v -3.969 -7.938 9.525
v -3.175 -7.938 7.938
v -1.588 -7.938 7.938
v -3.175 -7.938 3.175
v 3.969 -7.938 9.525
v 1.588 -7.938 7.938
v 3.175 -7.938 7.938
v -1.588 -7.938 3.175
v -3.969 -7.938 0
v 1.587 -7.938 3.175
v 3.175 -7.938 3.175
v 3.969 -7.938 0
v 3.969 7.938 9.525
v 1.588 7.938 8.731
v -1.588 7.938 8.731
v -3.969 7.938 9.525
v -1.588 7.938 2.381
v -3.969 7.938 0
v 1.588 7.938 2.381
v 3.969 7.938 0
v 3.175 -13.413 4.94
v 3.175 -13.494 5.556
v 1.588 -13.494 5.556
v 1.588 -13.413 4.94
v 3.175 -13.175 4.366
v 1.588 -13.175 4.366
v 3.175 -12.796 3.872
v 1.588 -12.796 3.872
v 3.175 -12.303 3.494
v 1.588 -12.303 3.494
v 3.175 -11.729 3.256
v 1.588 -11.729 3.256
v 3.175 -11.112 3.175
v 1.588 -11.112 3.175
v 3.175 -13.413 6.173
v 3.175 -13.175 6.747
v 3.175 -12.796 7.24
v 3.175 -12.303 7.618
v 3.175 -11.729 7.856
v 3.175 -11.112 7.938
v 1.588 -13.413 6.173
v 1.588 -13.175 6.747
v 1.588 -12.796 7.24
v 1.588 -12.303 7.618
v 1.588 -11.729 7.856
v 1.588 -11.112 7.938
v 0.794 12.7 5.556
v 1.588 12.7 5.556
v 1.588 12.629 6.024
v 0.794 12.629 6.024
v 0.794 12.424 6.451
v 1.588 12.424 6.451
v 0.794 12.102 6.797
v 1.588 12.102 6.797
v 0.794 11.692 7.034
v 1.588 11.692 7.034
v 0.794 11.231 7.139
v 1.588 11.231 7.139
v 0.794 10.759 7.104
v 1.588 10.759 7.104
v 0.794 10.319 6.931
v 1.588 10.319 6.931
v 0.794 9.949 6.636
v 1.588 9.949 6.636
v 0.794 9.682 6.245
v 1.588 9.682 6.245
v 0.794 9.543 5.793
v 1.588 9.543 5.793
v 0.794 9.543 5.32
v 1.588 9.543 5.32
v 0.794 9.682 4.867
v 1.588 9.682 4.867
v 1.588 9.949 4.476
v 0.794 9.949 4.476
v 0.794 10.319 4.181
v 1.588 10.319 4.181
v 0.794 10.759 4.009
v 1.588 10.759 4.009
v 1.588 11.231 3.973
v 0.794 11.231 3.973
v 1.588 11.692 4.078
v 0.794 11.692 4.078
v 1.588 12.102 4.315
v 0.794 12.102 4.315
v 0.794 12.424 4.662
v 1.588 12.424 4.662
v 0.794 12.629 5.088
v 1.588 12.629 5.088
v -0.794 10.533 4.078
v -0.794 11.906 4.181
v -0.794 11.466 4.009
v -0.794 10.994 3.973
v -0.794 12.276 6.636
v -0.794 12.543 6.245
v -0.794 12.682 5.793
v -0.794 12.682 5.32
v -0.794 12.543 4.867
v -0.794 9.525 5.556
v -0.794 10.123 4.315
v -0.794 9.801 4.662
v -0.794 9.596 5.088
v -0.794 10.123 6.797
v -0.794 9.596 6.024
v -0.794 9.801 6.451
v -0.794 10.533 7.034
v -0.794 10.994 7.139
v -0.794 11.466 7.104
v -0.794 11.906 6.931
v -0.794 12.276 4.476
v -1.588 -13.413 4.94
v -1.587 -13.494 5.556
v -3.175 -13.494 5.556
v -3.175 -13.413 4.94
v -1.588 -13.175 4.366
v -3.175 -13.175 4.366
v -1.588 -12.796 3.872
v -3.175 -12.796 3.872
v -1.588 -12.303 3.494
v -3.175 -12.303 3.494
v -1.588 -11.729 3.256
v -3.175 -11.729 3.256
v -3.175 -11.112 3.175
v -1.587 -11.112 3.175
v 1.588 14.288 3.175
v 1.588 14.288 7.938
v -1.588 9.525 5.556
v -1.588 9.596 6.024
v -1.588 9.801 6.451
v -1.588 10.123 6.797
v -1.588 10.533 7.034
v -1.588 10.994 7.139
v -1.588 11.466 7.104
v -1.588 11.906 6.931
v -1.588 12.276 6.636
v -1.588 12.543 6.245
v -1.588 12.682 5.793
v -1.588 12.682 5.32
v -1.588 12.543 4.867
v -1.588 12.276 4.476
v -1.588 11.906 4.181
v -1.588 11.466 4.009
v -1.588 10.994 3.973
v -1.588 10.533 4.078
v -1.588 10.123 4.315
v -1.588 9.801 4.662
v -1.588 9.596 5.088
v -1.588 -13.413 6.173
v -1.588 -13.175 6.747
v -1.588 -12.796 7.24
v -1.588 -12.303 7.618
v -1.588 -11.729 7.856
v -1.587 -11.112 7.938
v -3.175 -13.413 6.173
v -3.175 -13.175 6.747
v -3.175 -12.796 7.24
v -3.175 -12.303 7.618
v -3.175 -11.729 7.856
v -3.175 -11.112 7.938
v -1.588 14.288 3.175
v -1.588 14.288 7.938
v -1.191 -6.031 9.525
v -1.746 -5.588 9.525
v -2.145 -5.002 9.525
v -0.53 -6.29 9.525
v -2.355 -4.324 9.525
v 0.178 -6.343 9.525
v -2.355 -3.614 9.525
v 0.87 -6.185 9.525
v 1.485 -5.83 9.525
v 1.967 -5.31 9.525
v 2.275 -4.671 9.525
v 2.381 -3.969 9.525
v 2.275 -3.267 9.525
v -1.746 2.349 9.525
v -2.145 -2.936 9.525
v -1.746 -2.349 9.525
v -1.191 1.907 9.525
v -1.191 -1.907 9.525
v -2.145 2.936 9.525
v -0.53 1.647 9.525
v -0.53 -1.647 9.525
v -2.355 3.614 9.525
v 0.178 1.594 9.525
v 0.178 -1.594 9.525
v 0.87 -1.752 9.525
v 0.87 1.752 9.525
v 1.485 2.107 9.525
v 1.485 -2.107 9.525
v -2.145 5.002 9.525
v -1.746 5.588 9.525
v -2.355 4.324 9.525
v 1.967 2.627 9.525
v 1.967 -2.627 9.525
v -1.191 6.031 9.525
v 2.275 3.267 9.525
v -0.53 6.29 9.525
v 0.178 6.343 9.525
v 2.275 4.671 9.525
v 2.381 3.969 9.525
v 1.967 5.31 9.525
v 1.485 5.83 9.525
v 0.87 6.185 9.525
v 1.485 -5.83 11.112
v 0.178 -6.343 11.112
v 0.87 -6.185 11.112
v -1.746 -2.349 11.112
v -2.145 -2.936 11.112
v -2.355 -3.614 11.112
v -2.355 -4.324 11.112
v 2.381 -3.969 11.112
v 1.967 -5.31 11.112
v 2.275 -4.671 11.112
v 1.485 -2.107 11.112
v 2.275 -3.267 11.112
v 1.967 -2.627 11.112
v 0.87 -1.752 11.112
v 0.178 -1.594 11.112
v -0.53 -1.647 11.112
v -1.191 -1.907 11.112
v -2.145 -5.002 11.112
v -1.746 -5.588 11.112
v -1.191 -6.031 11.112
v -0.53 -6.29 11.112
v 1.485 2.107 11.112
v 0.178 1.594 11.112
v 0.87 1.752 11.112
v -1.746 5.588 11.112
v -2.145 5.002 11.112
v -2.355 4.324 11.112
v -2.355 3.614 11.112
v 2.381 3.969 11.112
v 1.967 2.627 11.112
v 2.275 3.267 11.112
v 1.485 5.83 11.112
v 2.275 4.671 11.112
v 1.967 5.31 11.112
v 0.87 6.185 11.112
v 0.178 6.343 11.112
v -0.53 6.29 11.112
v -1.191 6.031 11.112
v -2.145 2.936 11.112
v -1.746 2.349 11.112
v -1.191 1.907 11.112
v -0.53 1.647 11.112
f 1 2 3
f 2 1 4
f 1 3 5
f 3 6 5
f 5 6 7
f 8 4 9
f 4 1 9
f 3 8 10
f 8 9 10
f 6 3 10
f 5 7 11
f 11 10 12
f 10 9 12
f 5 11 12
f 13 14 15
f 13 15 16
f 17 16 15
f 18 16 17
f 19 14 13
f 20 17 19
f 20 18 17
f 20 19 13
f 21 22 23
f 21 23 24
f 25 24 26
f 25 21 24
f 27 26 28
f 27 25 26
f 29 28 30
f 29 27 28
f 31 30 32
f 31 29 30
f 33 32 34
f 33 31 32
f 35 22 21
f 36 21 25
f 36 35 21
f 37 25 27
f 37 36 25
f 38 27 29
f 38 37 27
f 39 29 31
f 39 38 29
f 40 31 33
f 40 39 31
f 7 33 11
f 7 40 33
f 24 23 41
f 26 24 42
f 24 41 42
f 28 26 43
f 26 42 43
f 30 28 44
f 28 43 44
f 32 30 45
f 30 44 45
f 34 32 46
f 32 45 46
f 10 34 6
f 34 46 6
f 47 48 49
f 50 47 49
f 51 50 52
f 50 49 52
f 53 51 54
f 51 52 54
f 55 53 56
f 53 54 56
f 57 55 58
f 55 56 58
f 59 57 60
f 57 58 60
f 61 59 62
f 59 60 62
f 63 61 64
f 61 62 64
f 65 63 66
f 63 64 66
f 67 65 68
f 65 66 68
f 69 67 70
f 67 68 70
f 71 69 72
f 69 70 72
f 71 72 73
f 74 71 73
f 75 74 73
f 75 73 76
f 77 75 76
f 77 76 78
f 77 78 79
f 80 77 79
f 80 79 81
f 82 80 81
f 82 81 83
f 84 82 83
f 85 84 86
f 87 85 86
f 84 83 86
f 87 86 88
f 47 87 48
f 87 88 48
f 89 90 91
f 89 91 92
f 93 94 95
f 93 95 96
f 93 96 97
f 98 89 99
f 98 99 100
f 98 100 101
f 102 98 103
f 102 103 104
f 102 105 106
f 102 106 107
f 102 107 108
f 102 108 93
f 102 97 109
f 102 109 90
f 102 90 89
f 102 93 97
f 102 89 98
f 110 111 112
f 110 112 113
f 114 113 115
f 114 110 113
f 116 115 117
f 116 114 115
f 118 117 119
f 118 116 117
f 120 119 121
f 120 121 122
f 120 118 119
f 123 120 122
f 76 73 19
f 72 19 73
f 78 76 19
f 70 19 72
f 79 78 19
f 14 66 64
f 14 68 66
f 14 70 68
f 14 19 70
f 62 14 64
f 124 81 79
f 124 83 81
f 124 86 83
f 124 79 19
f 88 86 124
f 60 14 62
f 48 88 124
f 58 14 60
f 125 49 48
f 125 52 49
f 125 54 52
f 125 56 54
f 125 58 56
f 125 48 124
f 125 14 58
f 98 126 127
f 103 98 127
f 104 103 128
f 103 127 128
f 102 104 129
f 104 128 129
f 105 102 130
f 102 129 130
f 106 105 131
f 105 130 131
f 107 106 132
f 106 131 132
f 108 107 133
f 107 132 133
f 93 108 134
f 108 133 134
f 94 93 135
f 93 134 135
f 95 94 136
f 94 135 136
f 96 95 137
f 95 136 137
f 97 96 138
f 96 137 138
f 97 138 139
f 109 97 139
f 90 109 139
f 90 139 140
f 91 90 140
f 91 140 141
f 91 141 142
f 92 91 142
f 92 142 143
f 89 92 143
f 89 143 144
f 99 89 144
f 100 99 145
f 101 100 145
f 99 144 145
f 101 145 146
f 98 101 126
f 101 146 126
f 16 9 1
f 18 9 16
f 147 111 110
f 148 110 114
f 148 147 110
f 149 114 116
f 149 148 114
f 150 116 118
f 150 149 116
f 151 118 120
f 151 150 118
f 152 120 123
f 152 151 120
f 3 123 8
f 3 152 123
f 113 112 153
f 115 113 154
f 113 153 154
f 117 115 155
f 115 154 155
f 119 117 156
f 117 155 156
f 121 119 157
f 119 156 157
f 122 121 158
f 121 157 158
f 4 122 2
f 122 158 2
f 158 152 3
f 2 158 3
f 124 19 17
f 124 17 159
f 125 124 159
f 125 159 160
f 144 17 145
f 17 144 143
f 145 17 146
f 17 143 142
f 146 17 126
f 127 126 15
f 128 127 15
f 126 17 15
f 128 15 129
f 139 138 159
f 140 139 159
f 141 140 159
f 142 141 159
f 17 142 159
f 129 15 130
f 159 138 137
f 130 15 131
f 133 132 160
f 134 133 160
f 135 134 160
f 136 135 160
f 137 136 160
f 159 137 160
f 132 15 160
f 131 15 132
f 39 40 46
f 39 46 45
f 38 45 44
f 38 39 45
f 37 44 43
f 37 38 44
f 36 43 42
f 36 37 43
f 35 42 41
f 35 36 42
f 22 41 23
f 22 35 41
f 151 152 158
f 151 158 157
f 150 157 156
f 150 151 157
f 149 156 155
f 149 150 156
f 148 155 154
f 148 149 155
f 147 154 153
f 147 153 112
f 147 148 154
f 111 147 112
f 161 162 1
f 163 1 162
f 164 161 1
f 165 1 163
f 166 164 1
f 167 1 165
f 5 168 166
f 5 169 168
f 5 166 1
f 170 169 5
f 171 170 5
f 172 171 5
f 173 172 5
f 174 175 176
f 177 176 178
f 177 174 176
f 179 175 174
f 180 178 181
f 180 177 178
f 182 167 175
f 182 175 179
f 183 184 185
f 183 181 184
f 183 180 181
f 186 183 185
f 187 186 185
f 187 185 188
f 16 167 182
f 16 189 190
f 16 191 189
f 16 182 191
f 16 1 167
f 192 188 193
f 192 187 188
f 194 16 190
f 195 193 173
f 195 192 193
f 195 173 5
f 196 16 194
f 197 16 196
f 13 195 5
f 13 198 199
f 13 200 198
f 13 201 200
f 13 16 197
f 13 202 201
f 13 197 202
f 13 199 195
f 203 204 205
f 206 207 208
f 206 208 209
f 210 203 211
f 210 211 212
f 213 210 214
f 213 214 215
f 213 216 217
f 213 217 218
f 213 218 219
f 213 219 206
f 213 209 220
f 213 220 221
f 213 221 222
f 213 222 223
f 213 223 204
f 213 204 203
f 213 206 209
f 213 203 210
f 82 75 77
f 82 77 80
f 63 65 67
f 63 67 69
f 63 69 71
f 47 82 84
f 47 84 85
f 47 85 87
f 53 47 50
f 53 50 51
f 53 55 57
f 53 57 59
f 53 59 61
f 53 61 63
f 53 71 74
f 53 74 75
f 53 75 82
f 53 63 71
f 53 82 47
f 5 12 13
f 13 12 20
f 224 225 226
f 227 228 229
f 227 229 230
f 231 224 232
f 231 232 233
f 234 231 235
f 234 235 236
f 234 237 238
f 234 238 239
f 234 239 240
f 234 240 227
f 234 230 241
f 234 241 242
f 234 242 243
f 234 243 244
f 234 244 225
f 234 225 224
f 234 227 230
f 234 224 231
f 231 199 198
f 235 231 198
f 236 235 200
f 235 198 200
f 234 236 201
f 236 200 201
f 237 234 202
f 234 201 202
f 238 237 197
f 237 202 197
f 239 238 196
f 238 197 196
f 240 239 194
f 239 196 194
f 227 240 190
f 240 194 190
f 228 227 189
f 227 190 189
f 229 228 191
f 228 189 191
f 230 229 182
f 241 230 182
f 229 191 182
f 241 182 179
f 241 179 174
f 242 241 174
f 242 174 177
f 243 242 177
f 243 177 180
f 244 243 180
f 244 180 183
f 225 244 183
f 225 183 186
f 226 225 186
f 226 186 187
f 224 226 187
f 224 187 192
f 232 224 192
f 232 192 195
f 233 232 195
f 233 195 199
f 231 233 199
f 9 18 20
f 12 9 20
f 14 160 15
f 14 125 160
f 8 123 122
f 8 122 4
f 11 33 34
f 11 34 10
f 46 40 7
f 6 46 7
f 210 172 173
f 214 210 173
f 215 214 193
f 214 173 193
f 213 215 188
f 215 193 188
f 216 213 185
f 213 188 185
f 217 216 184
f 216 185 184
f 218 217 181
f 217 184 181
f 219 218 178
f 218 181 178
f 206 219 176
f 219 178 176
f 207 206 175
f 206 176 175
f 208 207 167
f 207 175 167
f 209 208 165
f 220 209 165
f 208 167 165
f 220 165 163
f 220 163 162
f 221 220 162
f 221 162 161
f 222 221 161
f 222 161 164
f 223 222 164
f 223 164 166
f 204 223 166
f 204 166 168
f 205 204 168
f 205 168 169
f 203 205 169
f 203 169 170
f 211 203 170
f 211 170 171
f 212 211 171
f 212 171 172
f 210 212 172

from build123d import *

# Parameters (mm, degrees)
F0_W      = 7.9375
F0_H      = 15.875
F0_R      = 2.38125
F1_DEPTH  = 9.525
F2_DEPTH  = 11.1125
F3_W      = 3.175
F3_H      = 2.38125
F4_DEPTH  = 3.175
F5_W      = 1.5875
F5_H      = 6.35
F6_DEPTH  = 6.35
F7_DEPTH  = 1.5875
F8_R      = 1.5875
F9_DEPTH  = 0.79375
F10_R     = 1.5875
F11_DEPTH = 0.79375


with BuildPart() as f1:
    # F0 (on Top) → F1 (new body)
    with BuildSketch(Plane.XY):
        Rectangle(F0_W, F0_H)
        with Locations((0, -3.96875)):
            Circle(F0_R, mode=Mode.SUBTRACT)
        with Locations((0, 3.96875)):
            Circle(F0_R, mode=Mode.SUBTRACT)
    extrude(amount=F1_DEPTH)

    # F0 (on Top) → F2 (join)
    with BuildSketch(Plane.XY):
        with Locations((0, 3.96875)):
            Circle(F0_R)
        with Locations((0, -3.96875)):
            Circle(F0_R)
    extrude(amount=F2_DEPTH)

    # F3 (on Right) → F4 (join, symmetric)
    with BuildSketch(Plane.YZ):
        with Locations((-9.525, 6.746875)):
            Rectangle(F3_W, F3_H)
        with Locations((-9.525, 4.365625)):
            Rectangle(F3_W, F3_H)
        with BuildLine():
            Line((-13.49375, 5.55625), (-11.1125, 5.55625))
            Line((-11.1125, 5.55625), (-11.1125, 7.9375))
            ThreePointArc((-11.1125, 7.9375), (-12.796298, 7.240048), (-13.49375, 5.55625))
        make_face()
        with BuildLine():
            Line((-11.1125, 3.175), (-11.1125, 5.55625))
            Line((-11.1125, 5.55625), (-13.49375, 5.55625))
            ThreePointArc((-13.49375, 5.55625), (-12.796298, 3.872452), (-11.1125, 3.175))
        make_face()
    extrude(amount=F4_DEPTH, both=True)

    # F5 (on face) → F6 (cut)
    with BuildSketch(Plane.XY.offset(7.9375)):
        with Locations((0.79375, -11.1125)):
            Rectangle(F5_W, F5_H)
        with Locations((-0.79375, -11.1125)):
            Rectangle(F5_W, F5_H)
    extrude(amount=-F6_DEPTH, mode=Mode.SUBTRACT)

    # F3 (on Right) → F7 (join, symmetric)
    with BuildSketch(Plane.YZ):
        Polygon((7.9375, 8.73125), (7.9375, 5.55625), (14.2875, 5.55625), (14.2875, 7.9375), align=None)
        Polygon((14.2875, 5.55625), (7.9375, 5.55625), (7.9375, 2.38125), (14.2875, 3.175), align=None)
    extrude(amount=F7_DEPTH, both=True)

    # F8 (on face) → F9 (cut)
    with BuildSketch(Plane.YZ.offset(1.5875)):
        with Locations((11.1125, 5.55625)):
            Circle(F8_R)
    extrude(amount=-F9_DEPTH, mode=Mode.SUBTRACT)

    # F10 (on face) → F11 (cut)
    with BuildSketch(Plane(origin=(-1.5875, 0, 0), x_dir=(0, -1, 0), z_dir=(-1, 0, 0))):
        with Locations((-11.1125, 5.55625)):
            Circle(F10_R)
    extrude(amount=-F11_DEPTH, mode=Mode.SUBTRACT)


solid = f1.part
